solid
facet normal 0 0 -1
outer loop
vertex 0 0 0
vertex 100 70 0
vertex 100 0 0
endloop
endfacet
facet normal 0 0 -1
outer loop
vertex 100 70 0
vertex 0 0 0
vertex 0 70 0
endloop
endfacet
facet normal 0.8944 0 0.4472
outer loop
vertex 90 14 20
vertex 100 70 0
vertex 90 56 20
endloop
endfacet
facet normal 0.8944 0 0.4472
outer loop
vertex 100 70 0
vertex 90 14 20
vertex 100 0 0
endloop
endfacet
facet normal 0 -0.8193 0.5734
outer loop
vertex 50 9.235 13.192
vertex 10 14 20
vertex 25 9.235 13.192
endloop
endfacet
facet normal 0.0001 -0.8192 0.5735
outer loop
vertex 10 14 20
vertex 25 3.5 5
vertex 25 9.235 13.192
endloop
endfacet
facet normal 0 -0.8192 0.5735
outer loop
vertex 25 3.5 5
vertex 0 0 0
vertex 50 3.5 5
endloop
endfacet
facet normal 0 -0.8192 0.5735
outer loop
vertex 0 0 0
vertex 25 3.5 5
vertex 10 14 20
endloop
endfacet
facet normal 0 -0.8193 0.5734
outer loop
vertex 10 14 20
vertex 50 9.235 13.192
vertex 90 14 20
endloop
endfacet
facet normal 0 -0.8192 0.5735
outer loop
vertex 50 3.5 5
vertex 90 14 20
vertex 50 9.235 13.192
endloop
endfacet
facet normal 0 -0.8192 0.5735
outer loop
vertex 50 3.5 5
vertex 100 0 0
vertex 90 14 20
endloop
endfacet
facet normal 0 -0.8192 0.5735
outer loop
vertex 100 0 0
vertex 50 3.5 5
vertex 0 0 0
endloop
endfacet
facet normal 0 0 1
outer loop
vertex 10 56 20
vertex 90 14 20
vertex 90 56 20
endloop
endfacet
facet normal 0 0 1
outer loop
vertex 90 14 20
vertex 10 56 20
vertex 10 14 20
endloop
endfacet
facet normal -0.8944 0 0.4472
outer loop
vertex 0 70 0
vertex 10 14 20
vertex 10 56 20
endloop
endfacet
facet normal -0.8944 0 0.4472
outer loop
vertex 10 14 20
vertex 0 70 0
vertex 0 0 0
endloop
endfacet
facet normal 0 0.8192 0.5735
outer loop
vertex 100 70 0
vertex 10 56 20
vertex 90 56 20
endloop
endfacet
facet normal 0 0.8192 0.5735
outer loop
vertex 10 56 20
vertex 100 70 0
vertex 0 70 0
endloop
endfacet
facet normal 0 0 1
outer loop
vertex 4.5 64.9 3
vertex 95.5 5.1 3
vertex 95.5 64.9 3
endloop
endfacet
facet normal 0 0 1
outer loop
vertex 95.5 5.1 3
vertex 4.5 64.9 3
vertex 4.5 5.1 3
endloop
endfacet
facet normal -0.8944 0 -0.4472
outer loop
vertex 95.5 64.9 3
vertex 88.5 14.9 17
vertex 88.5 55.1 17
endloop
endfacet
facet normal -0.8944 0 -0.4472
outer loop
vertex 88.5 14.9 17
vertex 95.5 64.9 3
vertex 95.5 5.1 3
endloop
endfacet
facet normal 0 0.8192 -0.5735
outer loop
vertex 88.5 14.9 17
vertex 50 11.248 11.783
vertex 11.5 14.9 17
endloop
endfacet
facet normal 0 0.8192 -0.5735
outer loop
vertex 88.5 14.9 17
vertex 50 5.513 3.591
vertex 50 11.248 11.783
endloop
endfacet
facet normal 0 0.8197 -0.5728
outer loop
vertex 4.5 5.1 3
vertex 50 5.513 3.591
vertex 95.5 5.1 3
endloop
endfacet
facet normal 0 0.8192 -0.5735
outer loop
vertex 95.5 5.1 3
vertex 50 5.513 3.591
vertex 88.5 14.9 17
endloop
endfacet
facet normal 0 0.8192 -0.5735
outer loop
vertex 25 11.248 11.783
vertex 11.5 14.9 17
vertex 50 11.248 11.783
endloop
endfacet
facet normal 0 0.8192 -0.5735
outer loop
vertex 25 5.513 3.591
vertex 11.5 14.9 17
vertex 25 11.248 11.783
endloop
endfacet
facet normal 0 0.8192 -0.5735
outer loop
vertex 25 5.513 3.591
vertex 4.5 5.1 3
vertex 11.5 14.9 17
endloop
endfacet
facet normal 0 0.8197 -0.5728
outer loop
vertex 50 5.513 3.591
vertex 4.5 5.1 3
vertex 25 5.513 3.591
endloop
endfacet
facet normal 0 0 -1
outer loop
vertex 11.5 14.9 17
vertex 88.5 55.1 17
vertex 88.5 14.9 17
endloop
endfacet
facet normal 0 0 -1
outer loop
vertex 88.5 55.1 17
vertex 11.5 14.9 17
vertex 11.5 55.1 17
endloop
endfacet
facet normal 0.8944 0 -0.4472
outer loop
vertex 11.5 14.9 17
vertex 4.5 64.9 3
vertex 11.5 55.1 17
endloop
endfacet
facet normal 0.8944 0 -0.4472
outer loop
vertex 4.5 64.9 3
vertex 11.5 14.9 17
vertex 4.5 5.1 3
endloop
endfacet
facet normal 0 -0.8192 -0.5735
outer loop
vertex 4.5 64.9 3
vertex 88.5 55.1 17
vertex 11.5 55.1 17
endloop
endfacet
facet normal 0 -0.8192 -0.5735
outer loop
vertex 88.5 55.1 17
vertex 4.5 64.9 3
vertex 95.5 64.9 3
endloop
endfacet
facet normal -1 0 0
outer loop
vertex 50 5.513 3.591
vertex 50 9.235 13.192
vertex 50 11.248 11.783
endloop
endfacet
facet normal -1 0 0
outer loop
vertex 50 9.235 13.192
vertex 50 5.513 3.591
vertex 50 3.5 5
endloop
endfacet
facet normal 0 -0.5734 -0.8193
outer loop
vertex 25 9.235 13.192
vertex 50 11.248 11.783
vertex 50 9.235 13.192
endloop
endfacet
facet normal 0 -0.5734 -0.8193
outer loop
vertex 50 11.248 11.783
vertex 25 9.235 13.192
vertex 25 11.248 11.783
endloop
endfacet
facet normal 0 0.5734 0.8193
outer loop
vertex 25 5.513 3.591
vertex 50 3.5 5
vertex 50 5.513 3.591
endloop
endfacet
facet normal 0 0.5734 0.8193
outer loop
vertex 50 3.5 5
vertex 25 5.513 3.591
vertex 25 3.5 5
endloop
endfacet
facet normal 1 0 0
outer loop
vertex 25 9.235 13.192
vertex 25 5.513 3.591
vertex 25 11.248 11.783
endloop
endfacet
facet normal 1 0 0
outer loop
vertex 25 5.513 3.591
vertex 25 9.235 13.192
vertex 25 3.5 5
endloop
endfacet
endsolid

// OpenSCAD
// file: fustrum.scad
module fustrum(
    bw, // bottom width
    bd, // bottom depth
    tw, // top width
    td, // top depth
    xs, // x skew
    ys, // y skew
    ht  // height
)
{
    Points = [
        [ 0,     0,      0 ], // 0
        [ bw,    0,      0 ], // 1
        [ bw,    bd,     0 ], // 2
        [ 0,     bd,     0 ], // 3
        [ xs,    ys,    ht ], // 4
        [ xs+tw, ys,    ht ], // 5
        [ xs+tw, ys+td, ht ], // 6
        [ xs,    ys+td, ht ], // 7
    ];
    
    Faces = [
        [ 0, 1, 2, 3 ], // bottom
        [ 4, 5, 1, 0 ], // front
        [ 7, 6, 5, 4 ], // top
        [ 5, 6, 2, 1 ], // right
        [ 6, 7, 3, 2 ], // back
        [ 7, 4, 0, 3 ] // left
    ];
    
    polyhedron(Points, Faces);
}

module centered_fustrum(
    bw, // bottom width
    bd, // bottom depth
    tw, // top width
    td, // top depth
    ht  // height
)
{
    xs = (bw - tw) / 2; // x skew
    ys = (bd - td) / 2; // y skew
    
    fustrum(bw, bd, tw, td, xs, ys, ht);
}

difference()
{
    centered_fustrum(10, 20, 5, 10, 4);
    
    translate([0.5, 0.5, 0.5])
    centered_fustrum( 9, 19, 4,  9, 3);
}
// main file
use <fustrum.scad>

//scale of the full design
SCALE = 1;

///////////////////////////////////
//////////BASIC STRUCTURE//////////
///////////////////////////////////
//wall thickness
THICK = 3;

//top thickness
TOPTHICK = 3;

//bottom thickness
BOTTHICK = 3;

//height of the full design
HEIGHT = 20;

//dimensions of the bottom layer
BOTLENGTH = 100;
BOTWIDTH = 70;

//dimensions of the top layer
TOPLENGTH = 80;
TOPWIDTH = 42;

///////////////////////////////////
/////////////   LCD   /////////////
///////////////////////////////////
//dimensions of the LCD
L_LENGTH = 25;
L_WIDTH = 10;

//placement of the LCD (offset from 0,0)
L_XOFF = 25;
L_YOFF = 5;

///////////////////////////////////
///////////// DRAWING /////////////
///////////////////////////////////
difference(){ 
  //base shape   
  centered_fustrum(BOTLENGTH * SCALE, 
                   BOTWIDTH * SCALE,
                   TOPLENGTH * SCALE,
                   TOPWIDTH * SCALE,
                   HEIGHT * SCALE);
    
  //hollowed center  
  translate([((THICK) + (0.5*(BOTLENGTH - TOPLENGTH) * BOTTHICK / HEIGHT)) * SCALE,
             ((THICK) + (0.5*(BOTWIDTH - TOPWIDTH) * BOTTHICK / HEIGHT)) * SCALE,
              (BOTTHICK)*SCALE])
  centered_fustrum((BOTLENGTH-2*THICK-((BOTLENGTH-TOPLENGTH)*BOTTHICK/HEIGHT))*SCALE,
                   (BOTWIDTH-2*THICK-((BOTWIDTH-TOPWIDTH)*BOTTHICK/HEIGHT))*SCALE,
                   (TOPLENGTH-2*THICK+((BOTLENGTH-TOPLENGTH)*TOPTHICK/HEIGHT))*SCALE,
                   (TOPWIDTH-2*THICK+((BOTWIDTH-TOPWIDTH)*TOPTHICK/HEIGHT))*SCALE,
                   ((HEIGHT-TOPTHICK-BOTTHICK)*SCALE));

    //LCD cutout
    translate([L_XOFF * SCALE,
               L_YOFF *(tan(90 - atan(2*HEIGHT/(BOTWIDTH-TOPWIDTH)))) * SCALE,
               L_YOFF * SCALE]) 
    rotate(-90 + atan(2*HEIGHT/(BOTWIDTH-TOPWIDTH)),
          [1, 0, 0]) 
    cube([L_LENGTH * SCALE,
          THICK * SCALE,
          L_WIDTH * SCALE]);
}
